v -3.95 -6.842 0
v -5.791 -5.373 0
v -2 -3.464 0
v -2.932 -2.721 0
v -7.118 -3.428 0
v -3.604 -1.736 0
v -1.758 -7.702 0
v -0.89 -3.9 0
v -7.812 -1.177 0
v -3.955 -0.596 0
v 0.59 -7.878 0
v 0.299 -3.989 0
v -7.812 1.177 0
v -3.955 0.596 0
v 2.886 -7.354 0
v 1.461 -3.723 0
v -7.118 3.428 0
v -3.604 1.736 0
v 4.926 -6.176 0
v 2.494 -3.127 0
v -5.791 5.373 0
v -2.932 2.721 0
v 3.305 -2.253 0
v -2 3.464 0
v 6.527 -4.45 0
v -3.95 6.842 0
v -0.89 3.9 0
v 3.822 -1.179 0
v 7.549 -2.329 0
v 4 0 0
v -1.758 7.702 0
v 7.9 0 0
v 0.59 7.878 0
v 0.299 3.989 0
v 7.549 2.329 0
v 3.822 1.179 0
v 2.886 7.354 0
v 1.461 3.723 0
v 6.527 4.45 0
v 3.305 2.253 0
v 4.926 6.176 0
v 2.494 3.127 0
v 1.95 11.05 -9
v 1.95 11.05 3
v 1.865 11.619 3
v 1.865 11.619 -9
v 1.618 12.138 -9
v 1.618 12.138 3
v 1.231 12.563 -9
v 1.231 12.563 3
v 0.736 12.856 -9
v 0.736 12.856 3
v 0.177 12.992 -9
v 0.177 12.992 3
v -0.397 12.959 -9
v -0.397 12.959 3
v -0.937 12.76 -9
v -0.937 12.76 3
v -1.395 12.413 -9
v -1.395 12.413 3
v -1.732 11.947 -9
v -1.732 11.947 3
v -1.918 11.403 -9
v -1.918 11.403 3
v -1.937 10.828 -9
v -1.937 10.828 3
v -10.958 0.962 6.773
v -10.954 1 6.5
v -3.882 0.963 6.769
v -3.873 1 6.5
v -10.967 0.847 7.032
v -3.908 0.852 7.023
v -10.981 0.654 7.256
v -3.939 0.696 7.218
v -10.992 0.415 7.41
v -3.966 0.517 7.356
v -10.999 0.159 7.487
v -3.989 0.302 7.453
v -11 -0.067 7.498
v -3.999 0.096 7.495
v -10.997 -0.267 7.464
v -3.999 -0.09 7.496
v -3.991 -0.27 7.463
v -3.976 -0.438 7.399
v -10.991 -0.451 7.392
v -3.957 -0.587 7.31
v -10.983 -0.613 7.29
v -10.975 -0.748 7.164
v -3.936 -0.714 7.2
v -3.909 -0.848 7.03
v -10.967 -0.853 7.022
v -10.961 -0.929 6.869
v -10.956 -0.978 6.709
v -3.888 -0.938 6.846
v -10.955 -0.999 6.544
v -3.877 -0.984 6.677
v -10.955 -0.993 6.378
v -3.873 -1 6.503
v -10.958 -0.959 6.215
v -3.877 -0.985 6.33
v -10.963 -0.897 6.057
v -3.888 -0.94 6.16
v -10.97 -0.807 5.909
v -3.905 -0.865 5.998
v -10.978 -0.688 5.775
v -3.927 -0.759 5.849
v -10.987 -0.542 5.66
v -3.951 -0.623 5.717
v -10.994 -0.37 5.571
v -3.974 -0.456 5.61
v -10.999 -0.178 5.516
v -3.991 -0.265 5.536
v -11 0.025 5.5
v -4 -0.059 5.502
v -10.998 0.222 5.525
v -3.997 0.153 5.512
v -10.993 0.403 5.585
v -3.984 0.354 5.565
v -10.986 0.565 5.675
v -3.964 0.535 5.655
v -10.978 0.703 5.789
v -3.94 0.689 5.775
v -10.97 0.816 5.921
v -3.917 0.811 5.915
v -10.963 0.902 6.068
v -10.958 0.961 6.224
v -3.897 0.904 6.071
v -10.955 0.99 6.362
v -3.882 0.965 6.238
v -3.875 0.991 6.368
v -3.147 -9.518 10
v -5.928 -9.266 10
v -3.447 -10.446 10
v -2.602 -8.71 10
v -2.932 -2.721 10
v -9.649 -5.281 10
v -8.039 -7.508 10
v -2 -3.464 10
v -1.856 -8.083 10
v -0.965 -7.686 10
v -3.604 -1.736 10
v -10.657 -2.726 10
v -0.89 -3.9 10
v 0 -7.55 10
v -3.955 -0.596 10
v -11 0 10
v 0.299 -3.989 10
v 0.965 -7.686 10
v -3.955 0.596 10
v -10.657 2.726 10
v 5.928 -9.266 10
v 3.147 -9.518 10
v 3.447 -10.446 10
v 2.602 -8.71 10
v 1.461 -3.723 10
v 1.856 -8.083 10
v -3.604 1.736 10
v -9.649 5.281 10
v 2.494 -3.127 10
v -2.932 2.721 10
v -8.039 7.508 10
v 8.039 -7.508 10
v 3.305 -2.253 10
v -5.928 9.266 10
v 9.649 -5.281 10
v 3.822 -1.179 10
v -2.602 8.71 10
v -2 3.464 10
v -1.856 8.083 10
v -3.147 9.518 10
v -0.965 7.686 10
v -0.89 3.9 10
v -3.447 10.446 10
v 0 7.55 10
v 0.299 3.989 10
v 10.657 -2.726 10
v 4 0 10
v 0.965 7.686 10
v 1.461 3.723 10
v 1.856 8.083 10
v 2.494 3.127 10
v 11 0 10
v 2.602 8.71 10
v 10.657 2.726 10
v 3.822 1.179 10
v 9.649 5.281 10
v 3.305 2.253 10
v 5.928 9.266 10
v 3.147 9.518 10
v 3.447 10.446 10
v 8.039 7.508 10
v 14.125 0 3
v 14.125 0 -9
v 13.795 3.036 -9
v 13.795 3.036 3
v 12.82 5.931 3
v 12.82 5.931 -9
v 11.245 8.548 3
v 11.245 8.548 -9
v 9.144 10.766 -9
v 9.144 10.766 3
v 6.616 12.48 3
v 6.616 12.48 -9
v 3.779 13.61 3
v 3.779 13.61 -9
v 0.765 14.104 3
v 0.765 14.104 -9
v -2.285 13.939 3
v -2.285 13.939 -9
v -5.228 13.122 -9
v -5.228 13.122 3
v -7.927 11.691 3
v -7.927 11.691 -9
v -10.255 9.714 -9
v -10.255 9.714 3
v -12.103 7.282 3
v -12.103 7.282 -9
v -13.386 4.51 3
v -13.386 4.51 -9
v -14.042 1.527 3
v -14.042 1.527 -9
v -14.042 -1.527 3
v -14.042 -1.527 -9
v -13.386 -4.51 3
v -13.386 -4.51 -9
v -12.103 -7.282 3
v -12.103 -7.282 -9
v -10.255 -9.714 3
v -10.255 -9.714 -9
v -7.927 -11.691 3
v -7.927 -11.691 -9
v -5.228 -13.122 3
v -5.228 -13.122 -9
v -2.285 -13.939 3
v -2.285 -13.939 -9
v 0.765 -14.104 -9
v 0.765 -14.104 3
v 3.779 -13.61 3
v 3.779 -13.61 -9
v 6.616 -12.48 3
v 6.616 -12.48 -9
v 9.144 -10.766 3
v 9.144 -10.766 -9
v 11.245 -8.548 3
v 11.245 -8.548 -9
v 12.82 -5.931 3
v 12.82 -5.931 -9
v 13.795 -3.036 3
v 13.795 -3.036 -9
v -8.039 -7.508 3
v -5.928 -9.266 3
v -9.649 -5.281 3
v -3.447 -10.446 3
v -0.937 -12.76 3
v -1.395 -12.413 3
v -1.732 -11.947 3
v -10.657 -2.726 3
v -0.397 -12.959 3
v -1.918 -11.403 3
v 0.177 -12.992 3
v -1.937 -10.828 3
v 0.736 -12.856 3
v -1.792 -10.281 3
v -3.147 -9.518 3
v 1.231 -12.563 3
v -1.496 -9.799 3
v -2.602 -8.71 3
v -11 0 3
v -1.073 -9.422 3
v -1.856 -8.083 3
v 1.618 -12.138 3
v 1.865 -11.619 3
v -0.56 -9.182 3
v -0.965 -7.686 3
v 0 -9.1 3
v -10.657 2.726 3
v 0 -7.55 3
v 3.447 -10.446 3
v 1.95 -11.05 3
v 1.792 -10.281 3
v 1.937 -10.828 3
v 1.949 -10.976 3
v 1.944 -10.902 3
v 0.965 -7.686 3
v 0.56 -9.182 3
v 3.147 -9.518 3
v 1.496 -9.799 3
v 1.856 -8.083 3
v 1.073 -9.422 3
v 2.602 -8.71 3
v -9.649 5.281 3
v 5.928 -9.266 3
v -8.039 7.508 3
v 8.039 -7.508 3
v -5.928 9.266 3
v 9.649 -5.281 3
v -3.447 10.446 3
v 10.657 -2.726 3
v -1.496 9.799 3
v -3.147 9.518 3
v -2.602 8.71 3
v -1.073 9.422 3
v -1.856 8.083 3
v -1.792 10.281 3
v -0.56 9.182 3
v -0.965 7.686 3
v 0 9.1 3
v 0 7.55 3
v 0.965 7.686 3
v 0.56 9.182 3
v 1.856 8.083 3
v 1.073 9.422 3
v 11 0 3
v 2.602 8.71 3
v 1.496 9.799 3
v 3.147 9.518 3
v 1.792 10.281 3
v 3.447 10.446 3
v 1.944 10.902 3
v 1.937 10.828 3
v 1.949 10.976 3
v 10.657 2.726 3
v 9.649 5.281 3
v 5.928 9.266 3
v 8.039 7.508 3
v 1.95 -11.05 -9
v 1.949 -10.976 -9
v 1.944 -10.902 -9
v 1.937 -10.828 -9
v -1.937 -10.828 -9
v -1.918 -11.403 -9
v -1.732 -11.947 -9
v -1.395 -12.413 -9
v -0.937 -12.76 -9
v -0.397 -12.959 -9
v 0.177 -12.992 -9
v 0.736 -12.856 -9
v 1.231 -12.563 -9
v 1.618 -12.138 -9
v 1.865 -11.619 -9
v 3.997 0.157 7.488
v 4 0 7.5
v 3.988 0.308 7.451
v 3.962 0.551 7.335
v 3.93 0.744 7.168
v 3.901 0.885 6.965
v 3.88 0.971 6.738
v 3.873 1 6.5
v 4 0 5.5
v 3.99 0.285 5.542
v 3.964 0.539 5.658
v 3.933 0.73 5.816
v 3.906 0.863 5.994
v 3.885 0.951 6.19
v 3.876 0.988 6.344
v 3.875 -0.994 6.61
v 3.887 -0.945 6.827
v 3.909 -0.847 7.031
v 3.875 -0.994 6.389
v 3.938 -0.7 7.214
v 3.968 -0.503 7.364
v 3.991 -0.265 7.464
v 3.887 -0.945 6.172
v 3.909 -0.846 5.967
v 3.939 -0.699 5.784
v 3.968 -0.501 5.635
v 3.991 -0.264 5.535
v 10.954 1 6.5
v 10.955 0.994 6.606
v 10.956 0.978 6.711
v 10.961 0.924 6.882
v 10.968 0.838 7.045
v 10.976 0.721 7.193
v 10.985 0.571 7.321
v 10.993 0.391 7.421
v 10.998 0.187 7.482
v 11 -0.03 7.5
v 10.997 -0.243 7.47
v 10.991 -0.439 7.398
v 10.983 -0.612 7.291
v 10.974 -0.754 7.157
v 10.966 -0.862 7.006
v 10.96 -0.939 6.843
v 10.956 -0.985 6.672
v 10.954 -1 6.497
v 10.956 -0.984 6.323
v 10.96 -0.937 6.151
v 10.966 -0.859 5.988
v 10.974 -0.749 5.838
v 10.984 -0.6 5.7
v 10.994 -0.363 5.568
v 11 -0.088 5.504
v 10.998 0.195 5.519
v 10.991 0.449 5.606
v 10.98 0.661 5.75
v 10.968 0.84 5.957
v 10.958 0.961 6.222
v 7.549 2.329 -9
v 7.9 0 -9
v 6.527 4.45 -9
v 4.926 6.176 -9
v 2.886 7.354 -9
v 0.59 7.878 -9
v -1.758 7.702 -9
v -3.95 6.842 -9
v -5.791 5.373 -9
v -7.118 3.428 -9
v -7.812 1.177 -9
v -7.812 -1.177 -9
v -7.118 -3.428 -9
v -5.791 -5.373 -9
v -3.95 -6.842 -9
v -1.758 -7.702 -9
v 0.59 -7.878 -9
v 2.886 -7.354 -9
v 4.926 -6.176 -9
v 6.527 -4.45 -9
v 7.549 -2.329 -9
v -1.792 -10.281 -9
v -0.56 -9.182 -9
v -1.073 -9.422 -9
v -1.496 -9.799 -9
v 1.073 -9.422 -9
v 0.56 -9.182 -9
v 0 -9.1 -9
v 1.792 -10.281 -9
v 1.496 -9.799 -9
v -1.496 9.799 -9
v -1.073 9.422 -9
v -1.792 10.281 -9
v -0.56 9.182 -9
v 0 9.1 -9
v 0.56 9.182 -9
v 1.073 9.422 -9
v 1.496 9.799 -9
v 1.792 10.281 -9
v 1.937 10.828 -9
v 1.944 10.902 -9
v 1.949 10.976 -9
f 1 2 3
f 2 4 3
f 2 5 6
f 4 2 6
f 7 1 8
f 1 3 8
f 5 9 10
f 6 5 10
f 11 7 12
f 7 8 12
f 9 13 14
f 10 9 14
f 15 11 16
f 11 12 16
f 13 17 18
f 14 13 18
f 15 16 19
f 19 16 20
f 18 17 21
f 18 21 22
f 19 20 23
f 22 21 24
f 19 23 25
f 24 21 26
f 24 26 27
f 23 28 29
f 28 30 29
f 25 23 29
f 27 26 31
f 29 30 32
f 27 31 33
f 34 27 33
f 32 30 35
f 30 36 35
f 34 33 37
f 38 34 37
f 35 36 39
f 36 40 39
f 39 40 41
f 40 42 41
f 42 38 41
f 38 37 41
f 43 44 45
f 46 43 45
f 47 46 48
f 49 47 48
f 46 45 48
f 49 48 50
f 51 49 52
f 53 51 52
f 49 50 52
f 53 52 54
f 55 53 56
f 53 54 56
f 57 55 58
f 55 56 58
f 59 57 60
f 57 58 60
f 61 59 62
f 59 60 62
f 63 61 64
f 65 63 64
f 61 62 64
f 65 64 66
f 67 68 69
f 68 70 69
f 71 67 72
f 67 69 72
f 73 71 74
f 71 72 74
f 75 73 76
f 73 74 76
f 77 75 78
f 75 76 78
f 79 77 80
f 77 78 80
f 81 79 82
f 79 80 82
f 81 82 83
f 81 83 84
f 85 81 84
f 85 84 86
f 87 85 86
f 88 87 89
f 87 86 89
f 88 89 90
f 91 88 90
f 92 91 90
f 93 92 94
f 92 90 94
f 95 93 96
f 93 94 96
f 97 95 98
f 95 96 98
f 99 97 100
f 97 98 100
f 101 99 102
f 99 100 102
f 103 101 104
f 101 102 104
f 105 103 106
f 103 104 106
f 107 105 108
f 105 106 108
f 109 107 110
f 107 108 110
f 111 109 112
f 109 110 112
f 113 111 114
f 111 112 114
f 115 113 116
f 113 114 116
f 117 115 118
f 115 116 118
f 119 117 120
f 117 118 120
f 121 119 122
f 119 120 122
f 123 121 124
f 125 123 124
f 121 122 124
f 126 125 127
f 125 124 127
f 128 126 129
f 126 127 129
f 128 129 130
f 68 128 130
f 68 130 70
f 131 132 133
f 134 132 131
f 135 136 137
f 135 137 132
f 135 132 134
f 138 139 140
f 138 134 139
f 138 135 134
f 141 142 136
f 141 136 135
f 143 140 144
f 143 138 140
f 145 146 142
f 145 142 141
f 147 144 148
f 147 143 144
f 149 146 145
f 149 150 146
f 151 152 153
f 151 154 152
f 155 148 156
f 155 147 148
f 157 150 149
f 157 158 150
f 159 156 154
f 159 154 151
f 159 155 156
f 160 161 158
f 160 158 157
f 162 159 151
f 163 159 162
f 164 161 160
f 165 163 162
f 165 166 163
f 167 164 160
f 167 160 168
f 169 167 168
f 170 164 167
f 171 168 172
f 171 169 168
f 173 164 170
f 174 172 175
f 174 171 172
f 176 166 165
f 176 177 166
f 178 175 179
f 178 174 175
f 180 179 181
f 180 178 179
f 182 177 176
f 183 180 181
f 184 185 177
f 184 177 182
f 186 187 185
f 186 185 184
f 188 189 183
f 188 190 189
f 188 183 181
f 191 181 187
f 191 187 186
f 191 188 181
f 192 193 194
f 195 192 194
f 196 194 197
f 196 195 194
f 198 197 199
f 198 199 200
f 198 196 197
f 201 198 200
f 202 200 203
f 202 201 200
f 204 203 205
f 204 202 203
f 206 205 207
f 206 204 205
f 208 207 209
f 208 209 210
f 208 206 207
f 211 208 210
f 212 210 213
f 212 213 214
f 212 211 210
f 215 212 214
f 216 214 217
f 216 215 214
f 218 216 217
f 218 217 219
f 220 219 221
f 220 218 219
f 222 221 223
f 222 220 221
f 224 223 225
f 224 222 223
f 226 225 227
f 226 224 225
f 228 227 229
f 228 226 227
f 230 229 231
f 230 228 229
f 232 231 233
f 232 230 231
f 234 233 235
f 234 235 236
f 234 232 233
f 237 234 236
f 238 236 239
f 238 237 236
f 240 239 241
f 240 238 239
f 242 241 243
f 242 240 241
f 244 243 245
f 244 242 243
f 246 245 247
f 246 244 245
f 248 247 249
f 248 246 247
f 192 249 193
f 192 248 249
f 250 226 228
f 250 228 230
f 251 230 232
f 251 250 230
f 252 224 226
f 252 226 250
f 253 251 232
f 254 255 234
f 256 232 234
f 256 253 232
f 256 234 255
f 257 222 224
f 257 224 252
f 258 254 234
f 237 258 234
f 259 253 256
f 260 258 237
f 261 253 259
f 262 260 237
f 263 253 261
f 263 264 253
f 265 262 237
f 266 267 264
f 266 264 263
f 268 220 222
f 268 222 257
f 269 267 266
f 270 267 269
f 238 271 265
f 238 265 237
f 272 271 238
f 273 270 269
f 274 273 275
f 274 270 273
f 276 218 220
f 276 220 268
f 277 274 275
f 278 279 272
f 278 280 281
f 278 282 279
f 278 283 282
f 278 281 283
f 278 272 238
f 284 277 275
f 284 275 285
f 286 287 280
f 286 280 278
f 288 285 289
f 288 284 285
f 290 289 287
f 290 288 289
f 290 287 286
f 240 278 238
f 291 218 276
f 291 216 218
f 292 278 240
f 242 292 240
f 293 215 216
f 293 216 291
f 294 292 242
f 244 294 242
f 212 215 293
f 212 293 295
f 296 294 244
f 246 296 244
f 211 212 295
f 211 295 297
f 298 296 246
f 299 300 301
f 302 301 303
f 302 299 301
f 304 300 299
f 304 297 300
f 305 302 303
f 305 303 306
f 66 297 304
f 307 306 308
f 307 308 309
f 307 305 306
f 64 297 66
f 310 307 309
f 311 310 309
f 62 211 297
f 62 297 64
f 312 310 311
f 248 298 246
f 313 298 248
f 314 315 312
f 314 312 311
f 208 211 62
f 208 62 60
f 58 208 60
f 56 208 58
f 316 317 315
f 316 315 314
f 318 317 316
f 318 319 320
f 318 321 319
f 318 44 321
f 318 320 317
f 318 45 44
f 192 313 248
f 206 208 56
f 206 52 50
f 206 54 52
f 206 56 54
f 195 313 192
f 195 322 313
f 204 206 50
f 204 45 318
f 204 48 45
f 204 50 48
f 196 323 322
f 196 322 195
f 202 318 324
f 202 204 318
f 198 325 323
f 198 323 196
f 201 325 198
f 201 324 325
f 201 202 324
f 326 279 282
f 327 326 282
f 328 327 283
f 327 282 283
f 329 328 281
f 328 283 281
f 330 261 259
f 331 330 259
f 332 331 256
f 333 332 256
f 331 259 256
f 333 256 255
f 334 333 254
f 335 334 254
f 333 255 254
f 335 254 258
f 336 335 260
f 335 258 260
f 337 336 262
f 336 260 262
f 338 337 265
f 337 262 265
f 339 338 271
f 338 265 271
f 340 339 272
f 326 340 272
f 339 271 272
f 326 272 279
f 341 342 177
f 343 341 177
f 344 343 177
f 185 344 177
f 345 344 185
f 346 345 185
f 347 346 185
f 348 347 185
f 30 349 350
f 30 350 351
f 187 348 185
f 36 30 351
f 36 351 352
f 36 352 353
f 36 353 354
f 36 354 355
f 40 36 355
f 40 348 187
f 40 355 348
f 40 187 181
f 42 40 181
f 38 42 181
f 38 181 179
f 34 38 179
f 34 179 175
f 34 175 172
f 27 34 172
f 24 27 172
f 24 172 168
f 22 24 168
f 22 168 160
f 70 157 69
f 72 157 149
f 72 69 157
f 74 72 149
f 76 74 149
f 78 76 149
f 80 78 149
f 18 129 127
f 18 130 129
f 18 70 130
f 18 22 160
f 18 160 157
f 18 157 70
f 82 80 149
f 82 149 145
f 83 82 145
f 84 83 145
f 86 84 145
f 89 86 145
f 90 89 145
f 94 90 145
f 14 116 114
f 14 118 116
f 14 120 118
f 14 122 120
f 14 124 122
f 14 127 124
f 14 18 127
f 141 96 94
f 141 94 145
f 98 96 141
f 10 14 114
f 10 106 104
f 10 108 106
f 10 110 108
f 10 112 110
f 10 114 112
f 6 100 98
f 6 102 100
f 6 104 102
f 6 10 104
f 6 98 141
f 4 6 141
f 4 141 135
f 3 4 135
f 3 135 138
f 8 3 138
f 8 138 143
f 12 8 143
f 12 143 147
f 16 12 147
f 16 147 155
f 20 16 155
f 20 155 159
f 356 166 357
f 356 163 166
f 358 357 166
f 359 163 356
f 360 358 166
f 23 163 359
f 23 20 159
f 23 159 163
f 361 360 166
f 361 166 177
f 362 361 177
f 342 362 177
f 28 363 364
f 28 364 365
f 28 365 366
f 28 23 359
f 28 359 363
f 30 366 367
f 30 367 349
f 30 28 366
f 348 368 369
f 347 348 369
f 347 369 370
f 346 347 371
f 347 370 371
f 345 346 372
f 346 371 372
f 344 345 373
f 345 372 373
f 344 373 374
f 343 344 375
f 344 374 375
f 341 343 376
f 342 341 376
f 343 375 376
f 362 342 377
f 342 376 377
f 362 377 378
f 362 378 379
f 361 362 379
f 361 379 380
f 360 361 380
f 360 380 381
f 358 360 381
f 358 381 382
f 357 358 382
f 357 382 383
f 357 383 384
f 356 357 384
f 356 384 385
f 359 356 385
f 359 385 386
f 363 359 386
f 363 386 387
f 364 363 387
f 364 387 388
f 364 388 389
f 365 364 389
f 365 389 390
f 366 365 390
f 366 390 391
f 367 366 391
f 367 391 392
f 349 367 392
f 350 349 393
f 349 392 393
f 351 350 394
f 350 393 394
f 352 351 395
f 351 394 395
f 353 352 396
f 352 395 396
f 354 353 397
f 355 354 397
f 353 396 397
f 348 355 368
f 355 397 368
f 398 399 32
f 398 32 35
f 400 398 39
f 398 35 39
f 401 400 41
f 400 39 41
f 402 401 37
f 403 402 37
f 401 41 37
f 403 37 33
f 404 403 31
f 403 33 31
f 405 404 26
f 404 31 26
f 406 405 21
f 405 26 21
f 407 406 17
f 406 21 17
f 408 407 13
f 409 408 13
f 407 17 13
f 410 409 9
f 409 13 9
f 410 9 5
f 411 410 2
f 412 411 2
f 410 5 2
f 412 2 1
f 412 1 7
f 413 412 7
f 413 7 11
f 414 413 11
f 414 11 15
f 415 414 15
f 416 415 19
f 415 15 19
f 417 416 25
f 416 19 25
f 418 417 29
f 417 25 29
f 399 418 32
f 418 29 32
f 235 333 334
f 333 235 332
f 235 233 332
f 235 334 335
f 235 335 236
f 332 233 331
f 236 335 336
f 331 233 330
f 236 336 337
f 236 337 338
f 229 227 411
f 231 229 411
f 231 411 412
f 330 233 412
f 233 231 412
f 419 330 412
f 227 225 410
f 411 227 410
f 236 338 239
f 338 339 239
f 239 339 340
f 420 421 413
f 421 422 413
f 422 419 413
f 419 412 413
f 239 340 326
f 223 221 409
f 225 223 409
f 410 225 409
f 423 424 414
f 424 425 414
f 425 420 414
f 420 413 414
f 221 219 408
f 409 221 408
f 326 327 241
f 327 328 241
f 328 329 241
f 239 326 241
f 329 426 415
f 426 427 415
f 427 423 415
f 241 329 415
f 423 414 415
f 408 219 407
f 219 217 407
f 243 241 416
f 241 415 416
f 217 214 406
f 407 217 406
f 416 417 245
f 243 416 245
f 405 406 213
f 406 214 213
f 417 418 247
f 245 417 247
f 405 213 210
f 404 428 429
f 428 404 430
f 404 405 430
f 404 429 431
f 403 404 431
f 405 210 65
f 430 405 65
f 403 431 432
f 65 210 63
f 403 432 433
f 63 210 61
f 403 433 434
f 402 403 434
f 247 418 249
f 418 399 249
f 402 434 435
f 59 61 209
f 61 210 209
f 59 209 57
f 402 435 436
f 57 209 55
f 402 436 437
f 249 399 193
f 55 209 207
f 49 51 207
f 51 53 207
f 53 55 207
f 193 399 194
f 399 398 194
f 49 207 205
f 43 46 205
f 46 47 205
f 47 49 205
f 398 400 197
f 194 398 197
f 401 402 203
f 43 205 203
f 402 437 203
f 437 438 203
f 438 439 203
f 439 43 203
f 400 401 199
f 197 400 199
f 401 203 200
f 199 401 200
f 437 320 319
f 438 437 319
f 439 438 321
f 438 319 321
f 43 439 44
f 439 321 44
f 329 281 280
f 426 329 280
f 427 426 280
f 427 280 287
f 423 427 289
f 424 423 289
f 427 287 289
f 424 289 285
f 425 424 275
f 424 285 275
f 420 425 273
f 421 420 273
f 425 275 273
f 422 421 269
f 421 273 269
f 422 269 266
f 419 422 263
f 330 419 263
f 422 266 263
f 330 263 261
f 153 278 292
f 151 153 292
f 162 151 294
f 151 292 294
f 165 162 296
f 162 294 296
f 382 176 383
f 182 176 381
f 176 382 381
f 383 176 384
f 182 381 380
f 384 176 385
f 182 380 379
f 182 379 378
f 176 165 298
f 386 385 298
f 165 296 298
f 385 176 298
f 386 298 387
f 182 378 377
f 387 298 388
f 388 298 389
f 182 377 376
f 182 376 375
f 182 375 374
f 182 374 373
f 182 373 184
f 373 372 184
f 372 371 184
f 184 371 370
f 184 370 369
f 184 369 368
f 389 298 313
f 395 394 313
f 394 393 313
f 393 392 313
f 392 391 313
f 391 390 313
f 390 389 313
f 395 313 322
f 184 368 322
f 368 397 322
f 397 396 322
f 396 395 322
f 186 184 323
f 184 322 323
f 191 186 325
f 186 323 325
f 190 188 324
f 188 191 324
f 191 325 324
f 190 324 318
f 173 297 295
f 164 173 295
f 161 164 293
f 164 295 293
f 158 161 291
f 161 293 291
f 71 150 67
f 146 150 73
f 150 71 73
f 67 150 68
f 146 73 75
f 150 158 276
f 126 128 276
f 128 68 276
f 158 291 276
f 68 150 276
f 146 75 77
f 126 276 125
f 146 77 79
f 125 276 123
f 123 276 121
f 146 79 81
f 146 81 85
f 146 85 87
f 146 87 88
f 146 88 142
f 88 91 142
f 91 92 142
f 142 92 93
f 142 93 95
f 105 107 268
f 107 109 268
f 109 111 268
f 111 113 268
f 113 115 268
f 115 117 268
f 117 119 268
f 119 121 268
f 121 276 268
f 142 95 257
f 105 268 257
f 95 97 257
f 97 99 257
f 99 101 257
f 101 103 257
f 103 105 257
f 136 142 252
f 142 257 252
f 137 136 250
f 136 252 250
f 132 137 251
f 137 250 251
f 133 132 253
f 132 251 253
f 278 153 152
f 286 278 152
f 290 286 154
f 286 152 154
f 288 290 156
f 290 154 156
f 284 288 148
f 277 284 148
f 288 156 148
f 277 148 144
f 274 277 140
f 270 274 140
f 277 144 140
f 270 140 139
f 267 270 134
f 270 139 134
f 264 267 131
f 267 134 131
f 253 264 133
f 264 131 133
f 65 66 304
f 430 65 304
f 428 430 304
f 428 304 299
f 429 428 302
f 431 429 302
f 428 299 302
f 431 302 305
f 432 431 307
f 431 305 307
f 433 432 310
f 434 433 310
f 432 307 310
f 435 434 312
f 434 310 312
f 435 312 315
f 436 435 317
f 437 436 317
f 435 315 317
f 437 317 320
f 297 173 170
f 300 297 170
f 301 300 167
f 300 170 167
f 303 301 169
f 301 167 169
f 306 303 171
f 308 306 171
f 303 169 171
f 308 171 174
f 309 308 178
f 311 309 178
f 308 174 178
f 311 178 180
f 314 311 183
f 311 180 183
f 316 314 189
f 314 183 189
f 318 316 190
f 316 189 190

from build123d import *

# Parameters (mm, degrees)
F0_R      = 14.125
F0_R_2    = 11
F0_R_3    = 4
F1_DEPTH  = 3
F2_DEPTH  = 10
F3_R      = 14.125
F3_R_2    = 7.9
F4_DEPTH  = 9
F6_DEPTH  = 12
F7_R      = 1
F8_DEPTH  = 12.5
F10_DEPTH = 7


with BuildPart() as f1:
    # F0 (on Top) → F1 (new body)
    with BuildSketch(Plane.XY):
        Circle(F0_R)
        Circle(F0_R_2, mode=Mode.SUBTRACT)
        Circle(F0_R_2)
        Circle(F0_R_3, mode=Mode.SUBTRACT)
    extrude(amount=F1_DEPTH)

    # F0 (on Top) → F2 (join)
    with BuildSketch(Plane.XY):
        Circle(F0_R_2)
        Circle(F0_R_3, mode=Mode.SUBTRACT)
    extrude(amount=F2_DEPTH)

    # F3 (on Top) → F4 (join)
    with BuildSketch(Plane.XY):
        Circle(F3_R)
        Circle(F3_R_2, mode=Mode.SUBTRACT)
    extrude(amount=-F4_DEPTH)

    # F5 (on face) → F6 (cut, through all)
    with BuildSketch(Plane.XY.offset(3)):
        with BuildLine():
            ThreePointArc((1.9373280842, 10.8280542986), (0, 11), (-1.9373280842, 10.8280542986))
            ThreePointArc((-1.9373280842, 10.8280542986), (0, 9.1), (1.9373280842, 10.8280542986))
        make_face()
        with BuildLine():
            ThreePointArc((1.9373280842, 10.8280542986), (1.9468294435, 10.9388464218), (1.95, 11.05))
            ThreePointArc((1.95, 11.05), (-0.1111535782, 12.9968294435), (-1.9373280842, 10.8280542986))
            ThreePointArc((-1.9373280842, 10.8280542986), (0, 11), (1.9373280842, 10.8280542986))
        make_face()
        with BuildLine():
            ThreePointArc((1.9373280842, -10.8280542986), (0, -9.1), (-1.9373280842, -10.8280542986))
            ThreePointArc((-1.9373280842, -10.8280542986), (0, -11), (1.9373280842, -10.8280542986))
        make_face()
        with BuildLine():
            ThreePointArc((1.9373280842, -10.8280542986), (0, -11), (-1.9373280842, -10.8280542986))
            ThreePointArc((-1.9373280842, -10.8280542986), (-0.1111535782, -12.9968294435), (1.95, -11.05))
            ThreePointArc((1.95, -11.05), (1.9468294435, -10.9388464218), (1.9373280842, -10.8280542986))
        make_face()
    extrude(amount=-F6_DEPTH, mode=Mode.SUBTRACT)

    # F7 (on Right) → F8 (cut, symmetric)
    with BuildSketch(Plane.YZ):
        with Locations((0, 6.5)):
            Circle(F7_R)
    extrude(amount=F8_DEPTH, both=True, mode=Mode.SUBTRACT)

    # F9 (on face) → F10 (cut, through all)
    with BuildSketch(Plane.XY.offset(10)):
        with BuildLine():
            ThreePointArc((3.4474570131, 10.4458144796), (0, 11), (-3.4474570131, 10.4458144796))
            ThreePointArc((-3.4474570131, 10.4458144796), (0, 7.55), (3.4474570131, 10.4458144796))
        make_face()
        with BuildLine():
            ThreePointArc((3.4474570131, -10.4458144796), (0, -7.55), (-3.4474570131, -10.4458144796))
            ThreePointArc((-3.4474570131, -10.4458144796), (0, -11), (3.4474570131, -10.4458144796))
        make_face()
    extrude(amount=-F10_DEPTH, mode=Mode.SUBTRACT)


solid = f1.part
